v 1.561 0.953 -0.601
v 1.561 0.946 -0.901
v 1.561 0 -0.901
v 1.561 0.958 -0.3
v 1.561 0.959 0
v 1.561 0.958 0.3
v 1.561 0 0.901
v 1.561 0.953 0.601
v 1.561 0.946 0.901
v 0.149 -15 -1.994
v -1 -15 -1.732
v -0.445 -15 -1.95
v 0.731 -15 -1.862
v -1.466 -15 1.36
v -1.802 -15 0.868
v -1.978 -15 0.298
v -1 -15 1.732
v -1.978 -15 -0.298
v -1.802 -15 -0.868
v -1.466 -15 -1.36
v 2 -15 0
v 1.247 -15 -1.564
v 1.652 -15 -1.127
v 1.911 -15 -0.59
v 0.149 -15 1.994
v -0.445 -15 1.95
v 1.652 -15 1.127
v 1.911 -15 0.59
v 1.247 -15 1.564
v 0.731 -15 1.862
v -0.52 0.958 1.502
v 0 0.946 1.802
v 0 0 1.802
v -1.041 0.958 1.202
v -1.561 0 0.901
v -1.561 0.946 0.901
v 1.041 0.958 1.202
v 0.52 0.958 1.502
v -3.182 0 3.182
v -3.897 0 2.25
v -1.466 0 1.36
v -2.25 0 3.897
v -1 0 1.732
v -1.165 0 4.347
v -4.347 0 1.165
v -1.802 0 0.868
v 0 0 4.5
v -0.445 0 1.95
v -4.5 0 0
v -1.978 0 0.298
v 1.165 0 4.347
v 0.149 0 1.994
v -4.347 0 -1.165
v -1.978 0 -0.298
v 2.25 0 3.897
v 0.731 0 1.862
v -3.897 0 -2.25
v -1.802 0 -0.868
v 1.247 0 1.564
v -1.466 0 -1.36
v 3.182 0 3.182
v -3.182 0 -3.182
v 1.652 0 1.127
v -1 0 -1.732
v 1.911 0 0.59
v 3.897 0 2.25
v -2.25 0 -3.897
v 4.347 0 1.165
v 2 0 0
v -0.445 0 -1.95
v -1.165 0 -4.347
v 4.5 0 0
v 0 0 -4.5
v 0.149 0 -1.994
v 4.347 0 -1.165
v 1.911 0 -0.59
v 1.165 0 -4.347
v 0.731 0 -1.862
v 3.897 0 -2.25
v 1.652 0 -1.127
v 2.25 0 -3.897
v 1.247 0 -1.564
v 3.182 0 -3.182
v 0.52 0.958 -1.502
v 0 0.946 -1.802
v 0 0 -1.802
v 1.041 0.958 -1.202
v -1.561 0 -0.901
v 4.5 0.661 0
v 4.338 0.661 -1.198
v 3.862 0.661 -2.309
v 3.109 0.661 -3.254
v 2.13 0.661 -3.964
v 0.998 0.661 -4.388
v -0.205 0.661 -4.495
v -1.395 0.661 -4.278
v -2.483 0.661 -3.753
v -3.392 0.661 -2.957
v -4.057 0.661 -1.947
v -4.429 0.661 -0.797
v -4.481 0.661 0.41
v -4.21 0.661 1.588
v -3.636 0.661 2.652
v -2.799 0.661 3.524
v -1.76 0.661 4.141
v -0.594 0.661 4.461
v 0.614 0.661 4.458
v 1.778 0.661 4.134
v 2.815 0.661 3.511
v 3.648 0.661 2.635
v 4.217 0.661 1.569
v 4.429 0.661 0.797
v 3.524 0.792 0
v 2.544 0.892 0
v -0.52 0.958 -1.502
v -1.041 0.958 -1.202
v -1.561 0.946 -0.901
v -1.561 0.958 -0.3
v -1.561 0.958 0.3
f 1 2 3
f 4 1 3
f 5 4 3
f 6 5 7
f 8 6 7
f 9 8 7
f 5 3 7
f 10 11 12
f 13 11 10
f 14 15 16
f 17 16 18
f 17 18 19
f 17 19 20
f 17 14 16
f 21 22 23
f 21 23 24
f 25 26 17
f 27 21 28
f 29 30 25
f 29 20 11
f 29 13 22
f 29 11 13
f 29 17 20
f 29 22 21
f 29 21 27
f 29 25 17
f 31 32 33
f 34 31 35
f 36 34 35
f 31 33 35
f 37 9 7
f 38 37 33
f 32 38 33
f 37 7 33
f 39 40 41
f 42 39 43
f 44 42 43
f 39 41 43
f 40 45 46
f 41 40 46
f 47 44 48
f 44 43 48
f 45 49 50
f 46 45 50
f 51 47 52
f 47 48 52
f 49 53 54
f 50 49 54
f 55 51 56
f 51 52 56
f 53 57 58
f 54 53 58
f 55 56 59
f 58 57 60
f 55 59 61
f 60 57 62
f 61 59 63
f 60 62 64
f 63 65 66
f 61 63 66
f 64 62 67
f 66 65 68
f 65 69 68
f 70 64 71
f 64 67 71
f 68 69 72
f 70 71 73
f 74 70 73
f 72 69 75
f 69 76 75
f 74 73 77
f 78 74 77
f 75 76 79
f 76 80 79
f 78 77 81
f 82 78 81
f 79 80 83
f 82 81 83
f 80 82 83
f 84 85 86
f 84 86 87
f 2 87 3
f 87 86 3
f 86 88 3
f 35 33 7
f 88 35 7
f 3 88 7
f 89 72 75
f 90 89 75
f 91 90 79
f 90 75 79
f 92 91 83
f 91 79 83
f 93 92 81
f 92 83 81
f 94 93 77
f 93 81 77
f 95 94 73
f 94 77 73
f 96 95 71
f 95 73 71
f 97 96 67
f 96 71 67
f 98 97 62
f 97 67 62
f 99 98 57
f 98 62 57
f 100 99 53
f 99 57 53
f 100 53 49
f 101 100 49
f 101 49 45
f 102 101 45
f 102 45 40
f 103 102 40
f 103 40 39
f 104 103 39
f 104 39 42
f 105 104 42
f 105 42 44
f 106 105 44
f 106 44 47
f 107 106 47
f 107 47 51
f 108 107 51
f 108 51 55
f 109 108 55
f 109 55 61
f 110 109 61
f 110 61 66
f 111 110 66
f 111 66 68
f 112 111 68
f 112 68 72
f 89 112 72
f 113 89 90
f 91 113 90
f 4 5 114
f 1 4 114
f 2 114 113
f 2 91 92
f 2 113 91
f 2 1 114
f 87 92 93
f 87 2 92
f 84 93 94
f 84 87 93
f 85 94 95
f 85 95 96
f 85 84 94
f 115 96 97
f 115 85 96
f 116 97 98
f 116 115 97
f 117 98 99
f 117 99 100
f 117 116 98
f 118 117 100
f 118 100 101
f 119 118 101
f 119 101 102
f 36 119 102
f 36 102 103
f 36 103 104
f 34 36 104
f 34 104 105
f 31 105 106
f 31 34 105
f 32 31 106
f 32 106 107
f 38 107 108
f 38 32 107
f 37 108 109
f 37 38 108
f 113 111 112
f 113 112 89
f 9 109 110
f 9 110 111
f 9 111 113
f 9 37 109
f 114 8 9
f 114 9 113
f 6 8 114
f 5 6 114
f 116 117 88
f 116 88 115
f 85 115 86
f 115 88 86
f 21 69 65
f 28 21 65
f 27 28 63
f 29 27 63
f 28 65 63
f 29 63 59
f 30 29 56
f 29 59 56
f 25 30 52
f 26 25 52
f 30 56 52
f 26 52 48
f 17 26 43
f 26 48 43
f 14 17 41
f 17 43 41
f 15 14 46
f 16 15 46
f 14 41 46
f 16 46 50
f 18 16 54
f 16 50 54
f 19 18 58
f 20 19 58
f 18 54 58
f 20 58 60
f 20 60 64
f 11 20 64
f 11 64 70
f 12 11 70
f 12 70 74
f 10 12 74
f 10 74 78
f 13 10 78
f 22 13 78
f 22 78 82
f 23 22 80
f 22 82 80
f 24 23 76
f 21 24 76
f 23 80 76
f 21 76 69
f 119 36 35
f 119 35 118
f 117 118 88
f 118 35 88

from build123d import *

# Parameters (mm, degrees)
SKETCH_1_R          = 4.5
EXTRUDE_1_DEPTH     = 1
SKETCH_2_R          = 2
EXTRUDE_2_DEPTH     = 15
CUT_EXTRUDE_1_DEPTH = 1


with BuildPart() as part:
    # 草图1 → 凸台-拉伸1 (new body)
    with BuildSketch(Plane(origin=(0, 0, 0), x_dir=(1, 0, 0), z_dir=(0, 1, 0))):
        Circle(SKETCH_1_R)
    extrude(amount=EXTRUDE_1_DEPTH)

    # 草图2 → 凸台-拉伸2 (add)
    with BuildSketch(Plane.XZ):
        Circle(SKETCH_2_R)
    extrude(amount=EXTRUDE_2_DEPTH)

    # 草图3 → 切除-旋转2 (revolve, cut)
    with BuildSketch(Plane.XY):
        with BuildLine():
            ThreePointArc((5.590055425, 0.474587026), (2.807346543, 0.868357929), (0, 1))
            Line((0, 1), (0, 3.329372604))
            Line((0, 3.329372604), (5.734393967, 3.279293278))
            Line((5.734393967, 3.279293278), (5.590055425, 0.474587026))
        make_face()
    revolve(axis=Axis((0, 0, 0), (0, 1, 0)), mode=Mode.SUBTRACT)

    # 草图4 → 切除-拉伸1 (cut)
    with BuildSketch(Plane.XZ):
        Polygon((0, -1.802383699), (1.56091007, -0.901191849), (1.56091007, 0.901191849), (0, 1.802383699), (-1.56091007, 0.901191849), (-1.56091007, -0.901191849), align=None)
    extrude(amount=-CUT_EXTRUDE_1_DEPTH, mode=Mode.SUBTRACT)


solid = part.part
